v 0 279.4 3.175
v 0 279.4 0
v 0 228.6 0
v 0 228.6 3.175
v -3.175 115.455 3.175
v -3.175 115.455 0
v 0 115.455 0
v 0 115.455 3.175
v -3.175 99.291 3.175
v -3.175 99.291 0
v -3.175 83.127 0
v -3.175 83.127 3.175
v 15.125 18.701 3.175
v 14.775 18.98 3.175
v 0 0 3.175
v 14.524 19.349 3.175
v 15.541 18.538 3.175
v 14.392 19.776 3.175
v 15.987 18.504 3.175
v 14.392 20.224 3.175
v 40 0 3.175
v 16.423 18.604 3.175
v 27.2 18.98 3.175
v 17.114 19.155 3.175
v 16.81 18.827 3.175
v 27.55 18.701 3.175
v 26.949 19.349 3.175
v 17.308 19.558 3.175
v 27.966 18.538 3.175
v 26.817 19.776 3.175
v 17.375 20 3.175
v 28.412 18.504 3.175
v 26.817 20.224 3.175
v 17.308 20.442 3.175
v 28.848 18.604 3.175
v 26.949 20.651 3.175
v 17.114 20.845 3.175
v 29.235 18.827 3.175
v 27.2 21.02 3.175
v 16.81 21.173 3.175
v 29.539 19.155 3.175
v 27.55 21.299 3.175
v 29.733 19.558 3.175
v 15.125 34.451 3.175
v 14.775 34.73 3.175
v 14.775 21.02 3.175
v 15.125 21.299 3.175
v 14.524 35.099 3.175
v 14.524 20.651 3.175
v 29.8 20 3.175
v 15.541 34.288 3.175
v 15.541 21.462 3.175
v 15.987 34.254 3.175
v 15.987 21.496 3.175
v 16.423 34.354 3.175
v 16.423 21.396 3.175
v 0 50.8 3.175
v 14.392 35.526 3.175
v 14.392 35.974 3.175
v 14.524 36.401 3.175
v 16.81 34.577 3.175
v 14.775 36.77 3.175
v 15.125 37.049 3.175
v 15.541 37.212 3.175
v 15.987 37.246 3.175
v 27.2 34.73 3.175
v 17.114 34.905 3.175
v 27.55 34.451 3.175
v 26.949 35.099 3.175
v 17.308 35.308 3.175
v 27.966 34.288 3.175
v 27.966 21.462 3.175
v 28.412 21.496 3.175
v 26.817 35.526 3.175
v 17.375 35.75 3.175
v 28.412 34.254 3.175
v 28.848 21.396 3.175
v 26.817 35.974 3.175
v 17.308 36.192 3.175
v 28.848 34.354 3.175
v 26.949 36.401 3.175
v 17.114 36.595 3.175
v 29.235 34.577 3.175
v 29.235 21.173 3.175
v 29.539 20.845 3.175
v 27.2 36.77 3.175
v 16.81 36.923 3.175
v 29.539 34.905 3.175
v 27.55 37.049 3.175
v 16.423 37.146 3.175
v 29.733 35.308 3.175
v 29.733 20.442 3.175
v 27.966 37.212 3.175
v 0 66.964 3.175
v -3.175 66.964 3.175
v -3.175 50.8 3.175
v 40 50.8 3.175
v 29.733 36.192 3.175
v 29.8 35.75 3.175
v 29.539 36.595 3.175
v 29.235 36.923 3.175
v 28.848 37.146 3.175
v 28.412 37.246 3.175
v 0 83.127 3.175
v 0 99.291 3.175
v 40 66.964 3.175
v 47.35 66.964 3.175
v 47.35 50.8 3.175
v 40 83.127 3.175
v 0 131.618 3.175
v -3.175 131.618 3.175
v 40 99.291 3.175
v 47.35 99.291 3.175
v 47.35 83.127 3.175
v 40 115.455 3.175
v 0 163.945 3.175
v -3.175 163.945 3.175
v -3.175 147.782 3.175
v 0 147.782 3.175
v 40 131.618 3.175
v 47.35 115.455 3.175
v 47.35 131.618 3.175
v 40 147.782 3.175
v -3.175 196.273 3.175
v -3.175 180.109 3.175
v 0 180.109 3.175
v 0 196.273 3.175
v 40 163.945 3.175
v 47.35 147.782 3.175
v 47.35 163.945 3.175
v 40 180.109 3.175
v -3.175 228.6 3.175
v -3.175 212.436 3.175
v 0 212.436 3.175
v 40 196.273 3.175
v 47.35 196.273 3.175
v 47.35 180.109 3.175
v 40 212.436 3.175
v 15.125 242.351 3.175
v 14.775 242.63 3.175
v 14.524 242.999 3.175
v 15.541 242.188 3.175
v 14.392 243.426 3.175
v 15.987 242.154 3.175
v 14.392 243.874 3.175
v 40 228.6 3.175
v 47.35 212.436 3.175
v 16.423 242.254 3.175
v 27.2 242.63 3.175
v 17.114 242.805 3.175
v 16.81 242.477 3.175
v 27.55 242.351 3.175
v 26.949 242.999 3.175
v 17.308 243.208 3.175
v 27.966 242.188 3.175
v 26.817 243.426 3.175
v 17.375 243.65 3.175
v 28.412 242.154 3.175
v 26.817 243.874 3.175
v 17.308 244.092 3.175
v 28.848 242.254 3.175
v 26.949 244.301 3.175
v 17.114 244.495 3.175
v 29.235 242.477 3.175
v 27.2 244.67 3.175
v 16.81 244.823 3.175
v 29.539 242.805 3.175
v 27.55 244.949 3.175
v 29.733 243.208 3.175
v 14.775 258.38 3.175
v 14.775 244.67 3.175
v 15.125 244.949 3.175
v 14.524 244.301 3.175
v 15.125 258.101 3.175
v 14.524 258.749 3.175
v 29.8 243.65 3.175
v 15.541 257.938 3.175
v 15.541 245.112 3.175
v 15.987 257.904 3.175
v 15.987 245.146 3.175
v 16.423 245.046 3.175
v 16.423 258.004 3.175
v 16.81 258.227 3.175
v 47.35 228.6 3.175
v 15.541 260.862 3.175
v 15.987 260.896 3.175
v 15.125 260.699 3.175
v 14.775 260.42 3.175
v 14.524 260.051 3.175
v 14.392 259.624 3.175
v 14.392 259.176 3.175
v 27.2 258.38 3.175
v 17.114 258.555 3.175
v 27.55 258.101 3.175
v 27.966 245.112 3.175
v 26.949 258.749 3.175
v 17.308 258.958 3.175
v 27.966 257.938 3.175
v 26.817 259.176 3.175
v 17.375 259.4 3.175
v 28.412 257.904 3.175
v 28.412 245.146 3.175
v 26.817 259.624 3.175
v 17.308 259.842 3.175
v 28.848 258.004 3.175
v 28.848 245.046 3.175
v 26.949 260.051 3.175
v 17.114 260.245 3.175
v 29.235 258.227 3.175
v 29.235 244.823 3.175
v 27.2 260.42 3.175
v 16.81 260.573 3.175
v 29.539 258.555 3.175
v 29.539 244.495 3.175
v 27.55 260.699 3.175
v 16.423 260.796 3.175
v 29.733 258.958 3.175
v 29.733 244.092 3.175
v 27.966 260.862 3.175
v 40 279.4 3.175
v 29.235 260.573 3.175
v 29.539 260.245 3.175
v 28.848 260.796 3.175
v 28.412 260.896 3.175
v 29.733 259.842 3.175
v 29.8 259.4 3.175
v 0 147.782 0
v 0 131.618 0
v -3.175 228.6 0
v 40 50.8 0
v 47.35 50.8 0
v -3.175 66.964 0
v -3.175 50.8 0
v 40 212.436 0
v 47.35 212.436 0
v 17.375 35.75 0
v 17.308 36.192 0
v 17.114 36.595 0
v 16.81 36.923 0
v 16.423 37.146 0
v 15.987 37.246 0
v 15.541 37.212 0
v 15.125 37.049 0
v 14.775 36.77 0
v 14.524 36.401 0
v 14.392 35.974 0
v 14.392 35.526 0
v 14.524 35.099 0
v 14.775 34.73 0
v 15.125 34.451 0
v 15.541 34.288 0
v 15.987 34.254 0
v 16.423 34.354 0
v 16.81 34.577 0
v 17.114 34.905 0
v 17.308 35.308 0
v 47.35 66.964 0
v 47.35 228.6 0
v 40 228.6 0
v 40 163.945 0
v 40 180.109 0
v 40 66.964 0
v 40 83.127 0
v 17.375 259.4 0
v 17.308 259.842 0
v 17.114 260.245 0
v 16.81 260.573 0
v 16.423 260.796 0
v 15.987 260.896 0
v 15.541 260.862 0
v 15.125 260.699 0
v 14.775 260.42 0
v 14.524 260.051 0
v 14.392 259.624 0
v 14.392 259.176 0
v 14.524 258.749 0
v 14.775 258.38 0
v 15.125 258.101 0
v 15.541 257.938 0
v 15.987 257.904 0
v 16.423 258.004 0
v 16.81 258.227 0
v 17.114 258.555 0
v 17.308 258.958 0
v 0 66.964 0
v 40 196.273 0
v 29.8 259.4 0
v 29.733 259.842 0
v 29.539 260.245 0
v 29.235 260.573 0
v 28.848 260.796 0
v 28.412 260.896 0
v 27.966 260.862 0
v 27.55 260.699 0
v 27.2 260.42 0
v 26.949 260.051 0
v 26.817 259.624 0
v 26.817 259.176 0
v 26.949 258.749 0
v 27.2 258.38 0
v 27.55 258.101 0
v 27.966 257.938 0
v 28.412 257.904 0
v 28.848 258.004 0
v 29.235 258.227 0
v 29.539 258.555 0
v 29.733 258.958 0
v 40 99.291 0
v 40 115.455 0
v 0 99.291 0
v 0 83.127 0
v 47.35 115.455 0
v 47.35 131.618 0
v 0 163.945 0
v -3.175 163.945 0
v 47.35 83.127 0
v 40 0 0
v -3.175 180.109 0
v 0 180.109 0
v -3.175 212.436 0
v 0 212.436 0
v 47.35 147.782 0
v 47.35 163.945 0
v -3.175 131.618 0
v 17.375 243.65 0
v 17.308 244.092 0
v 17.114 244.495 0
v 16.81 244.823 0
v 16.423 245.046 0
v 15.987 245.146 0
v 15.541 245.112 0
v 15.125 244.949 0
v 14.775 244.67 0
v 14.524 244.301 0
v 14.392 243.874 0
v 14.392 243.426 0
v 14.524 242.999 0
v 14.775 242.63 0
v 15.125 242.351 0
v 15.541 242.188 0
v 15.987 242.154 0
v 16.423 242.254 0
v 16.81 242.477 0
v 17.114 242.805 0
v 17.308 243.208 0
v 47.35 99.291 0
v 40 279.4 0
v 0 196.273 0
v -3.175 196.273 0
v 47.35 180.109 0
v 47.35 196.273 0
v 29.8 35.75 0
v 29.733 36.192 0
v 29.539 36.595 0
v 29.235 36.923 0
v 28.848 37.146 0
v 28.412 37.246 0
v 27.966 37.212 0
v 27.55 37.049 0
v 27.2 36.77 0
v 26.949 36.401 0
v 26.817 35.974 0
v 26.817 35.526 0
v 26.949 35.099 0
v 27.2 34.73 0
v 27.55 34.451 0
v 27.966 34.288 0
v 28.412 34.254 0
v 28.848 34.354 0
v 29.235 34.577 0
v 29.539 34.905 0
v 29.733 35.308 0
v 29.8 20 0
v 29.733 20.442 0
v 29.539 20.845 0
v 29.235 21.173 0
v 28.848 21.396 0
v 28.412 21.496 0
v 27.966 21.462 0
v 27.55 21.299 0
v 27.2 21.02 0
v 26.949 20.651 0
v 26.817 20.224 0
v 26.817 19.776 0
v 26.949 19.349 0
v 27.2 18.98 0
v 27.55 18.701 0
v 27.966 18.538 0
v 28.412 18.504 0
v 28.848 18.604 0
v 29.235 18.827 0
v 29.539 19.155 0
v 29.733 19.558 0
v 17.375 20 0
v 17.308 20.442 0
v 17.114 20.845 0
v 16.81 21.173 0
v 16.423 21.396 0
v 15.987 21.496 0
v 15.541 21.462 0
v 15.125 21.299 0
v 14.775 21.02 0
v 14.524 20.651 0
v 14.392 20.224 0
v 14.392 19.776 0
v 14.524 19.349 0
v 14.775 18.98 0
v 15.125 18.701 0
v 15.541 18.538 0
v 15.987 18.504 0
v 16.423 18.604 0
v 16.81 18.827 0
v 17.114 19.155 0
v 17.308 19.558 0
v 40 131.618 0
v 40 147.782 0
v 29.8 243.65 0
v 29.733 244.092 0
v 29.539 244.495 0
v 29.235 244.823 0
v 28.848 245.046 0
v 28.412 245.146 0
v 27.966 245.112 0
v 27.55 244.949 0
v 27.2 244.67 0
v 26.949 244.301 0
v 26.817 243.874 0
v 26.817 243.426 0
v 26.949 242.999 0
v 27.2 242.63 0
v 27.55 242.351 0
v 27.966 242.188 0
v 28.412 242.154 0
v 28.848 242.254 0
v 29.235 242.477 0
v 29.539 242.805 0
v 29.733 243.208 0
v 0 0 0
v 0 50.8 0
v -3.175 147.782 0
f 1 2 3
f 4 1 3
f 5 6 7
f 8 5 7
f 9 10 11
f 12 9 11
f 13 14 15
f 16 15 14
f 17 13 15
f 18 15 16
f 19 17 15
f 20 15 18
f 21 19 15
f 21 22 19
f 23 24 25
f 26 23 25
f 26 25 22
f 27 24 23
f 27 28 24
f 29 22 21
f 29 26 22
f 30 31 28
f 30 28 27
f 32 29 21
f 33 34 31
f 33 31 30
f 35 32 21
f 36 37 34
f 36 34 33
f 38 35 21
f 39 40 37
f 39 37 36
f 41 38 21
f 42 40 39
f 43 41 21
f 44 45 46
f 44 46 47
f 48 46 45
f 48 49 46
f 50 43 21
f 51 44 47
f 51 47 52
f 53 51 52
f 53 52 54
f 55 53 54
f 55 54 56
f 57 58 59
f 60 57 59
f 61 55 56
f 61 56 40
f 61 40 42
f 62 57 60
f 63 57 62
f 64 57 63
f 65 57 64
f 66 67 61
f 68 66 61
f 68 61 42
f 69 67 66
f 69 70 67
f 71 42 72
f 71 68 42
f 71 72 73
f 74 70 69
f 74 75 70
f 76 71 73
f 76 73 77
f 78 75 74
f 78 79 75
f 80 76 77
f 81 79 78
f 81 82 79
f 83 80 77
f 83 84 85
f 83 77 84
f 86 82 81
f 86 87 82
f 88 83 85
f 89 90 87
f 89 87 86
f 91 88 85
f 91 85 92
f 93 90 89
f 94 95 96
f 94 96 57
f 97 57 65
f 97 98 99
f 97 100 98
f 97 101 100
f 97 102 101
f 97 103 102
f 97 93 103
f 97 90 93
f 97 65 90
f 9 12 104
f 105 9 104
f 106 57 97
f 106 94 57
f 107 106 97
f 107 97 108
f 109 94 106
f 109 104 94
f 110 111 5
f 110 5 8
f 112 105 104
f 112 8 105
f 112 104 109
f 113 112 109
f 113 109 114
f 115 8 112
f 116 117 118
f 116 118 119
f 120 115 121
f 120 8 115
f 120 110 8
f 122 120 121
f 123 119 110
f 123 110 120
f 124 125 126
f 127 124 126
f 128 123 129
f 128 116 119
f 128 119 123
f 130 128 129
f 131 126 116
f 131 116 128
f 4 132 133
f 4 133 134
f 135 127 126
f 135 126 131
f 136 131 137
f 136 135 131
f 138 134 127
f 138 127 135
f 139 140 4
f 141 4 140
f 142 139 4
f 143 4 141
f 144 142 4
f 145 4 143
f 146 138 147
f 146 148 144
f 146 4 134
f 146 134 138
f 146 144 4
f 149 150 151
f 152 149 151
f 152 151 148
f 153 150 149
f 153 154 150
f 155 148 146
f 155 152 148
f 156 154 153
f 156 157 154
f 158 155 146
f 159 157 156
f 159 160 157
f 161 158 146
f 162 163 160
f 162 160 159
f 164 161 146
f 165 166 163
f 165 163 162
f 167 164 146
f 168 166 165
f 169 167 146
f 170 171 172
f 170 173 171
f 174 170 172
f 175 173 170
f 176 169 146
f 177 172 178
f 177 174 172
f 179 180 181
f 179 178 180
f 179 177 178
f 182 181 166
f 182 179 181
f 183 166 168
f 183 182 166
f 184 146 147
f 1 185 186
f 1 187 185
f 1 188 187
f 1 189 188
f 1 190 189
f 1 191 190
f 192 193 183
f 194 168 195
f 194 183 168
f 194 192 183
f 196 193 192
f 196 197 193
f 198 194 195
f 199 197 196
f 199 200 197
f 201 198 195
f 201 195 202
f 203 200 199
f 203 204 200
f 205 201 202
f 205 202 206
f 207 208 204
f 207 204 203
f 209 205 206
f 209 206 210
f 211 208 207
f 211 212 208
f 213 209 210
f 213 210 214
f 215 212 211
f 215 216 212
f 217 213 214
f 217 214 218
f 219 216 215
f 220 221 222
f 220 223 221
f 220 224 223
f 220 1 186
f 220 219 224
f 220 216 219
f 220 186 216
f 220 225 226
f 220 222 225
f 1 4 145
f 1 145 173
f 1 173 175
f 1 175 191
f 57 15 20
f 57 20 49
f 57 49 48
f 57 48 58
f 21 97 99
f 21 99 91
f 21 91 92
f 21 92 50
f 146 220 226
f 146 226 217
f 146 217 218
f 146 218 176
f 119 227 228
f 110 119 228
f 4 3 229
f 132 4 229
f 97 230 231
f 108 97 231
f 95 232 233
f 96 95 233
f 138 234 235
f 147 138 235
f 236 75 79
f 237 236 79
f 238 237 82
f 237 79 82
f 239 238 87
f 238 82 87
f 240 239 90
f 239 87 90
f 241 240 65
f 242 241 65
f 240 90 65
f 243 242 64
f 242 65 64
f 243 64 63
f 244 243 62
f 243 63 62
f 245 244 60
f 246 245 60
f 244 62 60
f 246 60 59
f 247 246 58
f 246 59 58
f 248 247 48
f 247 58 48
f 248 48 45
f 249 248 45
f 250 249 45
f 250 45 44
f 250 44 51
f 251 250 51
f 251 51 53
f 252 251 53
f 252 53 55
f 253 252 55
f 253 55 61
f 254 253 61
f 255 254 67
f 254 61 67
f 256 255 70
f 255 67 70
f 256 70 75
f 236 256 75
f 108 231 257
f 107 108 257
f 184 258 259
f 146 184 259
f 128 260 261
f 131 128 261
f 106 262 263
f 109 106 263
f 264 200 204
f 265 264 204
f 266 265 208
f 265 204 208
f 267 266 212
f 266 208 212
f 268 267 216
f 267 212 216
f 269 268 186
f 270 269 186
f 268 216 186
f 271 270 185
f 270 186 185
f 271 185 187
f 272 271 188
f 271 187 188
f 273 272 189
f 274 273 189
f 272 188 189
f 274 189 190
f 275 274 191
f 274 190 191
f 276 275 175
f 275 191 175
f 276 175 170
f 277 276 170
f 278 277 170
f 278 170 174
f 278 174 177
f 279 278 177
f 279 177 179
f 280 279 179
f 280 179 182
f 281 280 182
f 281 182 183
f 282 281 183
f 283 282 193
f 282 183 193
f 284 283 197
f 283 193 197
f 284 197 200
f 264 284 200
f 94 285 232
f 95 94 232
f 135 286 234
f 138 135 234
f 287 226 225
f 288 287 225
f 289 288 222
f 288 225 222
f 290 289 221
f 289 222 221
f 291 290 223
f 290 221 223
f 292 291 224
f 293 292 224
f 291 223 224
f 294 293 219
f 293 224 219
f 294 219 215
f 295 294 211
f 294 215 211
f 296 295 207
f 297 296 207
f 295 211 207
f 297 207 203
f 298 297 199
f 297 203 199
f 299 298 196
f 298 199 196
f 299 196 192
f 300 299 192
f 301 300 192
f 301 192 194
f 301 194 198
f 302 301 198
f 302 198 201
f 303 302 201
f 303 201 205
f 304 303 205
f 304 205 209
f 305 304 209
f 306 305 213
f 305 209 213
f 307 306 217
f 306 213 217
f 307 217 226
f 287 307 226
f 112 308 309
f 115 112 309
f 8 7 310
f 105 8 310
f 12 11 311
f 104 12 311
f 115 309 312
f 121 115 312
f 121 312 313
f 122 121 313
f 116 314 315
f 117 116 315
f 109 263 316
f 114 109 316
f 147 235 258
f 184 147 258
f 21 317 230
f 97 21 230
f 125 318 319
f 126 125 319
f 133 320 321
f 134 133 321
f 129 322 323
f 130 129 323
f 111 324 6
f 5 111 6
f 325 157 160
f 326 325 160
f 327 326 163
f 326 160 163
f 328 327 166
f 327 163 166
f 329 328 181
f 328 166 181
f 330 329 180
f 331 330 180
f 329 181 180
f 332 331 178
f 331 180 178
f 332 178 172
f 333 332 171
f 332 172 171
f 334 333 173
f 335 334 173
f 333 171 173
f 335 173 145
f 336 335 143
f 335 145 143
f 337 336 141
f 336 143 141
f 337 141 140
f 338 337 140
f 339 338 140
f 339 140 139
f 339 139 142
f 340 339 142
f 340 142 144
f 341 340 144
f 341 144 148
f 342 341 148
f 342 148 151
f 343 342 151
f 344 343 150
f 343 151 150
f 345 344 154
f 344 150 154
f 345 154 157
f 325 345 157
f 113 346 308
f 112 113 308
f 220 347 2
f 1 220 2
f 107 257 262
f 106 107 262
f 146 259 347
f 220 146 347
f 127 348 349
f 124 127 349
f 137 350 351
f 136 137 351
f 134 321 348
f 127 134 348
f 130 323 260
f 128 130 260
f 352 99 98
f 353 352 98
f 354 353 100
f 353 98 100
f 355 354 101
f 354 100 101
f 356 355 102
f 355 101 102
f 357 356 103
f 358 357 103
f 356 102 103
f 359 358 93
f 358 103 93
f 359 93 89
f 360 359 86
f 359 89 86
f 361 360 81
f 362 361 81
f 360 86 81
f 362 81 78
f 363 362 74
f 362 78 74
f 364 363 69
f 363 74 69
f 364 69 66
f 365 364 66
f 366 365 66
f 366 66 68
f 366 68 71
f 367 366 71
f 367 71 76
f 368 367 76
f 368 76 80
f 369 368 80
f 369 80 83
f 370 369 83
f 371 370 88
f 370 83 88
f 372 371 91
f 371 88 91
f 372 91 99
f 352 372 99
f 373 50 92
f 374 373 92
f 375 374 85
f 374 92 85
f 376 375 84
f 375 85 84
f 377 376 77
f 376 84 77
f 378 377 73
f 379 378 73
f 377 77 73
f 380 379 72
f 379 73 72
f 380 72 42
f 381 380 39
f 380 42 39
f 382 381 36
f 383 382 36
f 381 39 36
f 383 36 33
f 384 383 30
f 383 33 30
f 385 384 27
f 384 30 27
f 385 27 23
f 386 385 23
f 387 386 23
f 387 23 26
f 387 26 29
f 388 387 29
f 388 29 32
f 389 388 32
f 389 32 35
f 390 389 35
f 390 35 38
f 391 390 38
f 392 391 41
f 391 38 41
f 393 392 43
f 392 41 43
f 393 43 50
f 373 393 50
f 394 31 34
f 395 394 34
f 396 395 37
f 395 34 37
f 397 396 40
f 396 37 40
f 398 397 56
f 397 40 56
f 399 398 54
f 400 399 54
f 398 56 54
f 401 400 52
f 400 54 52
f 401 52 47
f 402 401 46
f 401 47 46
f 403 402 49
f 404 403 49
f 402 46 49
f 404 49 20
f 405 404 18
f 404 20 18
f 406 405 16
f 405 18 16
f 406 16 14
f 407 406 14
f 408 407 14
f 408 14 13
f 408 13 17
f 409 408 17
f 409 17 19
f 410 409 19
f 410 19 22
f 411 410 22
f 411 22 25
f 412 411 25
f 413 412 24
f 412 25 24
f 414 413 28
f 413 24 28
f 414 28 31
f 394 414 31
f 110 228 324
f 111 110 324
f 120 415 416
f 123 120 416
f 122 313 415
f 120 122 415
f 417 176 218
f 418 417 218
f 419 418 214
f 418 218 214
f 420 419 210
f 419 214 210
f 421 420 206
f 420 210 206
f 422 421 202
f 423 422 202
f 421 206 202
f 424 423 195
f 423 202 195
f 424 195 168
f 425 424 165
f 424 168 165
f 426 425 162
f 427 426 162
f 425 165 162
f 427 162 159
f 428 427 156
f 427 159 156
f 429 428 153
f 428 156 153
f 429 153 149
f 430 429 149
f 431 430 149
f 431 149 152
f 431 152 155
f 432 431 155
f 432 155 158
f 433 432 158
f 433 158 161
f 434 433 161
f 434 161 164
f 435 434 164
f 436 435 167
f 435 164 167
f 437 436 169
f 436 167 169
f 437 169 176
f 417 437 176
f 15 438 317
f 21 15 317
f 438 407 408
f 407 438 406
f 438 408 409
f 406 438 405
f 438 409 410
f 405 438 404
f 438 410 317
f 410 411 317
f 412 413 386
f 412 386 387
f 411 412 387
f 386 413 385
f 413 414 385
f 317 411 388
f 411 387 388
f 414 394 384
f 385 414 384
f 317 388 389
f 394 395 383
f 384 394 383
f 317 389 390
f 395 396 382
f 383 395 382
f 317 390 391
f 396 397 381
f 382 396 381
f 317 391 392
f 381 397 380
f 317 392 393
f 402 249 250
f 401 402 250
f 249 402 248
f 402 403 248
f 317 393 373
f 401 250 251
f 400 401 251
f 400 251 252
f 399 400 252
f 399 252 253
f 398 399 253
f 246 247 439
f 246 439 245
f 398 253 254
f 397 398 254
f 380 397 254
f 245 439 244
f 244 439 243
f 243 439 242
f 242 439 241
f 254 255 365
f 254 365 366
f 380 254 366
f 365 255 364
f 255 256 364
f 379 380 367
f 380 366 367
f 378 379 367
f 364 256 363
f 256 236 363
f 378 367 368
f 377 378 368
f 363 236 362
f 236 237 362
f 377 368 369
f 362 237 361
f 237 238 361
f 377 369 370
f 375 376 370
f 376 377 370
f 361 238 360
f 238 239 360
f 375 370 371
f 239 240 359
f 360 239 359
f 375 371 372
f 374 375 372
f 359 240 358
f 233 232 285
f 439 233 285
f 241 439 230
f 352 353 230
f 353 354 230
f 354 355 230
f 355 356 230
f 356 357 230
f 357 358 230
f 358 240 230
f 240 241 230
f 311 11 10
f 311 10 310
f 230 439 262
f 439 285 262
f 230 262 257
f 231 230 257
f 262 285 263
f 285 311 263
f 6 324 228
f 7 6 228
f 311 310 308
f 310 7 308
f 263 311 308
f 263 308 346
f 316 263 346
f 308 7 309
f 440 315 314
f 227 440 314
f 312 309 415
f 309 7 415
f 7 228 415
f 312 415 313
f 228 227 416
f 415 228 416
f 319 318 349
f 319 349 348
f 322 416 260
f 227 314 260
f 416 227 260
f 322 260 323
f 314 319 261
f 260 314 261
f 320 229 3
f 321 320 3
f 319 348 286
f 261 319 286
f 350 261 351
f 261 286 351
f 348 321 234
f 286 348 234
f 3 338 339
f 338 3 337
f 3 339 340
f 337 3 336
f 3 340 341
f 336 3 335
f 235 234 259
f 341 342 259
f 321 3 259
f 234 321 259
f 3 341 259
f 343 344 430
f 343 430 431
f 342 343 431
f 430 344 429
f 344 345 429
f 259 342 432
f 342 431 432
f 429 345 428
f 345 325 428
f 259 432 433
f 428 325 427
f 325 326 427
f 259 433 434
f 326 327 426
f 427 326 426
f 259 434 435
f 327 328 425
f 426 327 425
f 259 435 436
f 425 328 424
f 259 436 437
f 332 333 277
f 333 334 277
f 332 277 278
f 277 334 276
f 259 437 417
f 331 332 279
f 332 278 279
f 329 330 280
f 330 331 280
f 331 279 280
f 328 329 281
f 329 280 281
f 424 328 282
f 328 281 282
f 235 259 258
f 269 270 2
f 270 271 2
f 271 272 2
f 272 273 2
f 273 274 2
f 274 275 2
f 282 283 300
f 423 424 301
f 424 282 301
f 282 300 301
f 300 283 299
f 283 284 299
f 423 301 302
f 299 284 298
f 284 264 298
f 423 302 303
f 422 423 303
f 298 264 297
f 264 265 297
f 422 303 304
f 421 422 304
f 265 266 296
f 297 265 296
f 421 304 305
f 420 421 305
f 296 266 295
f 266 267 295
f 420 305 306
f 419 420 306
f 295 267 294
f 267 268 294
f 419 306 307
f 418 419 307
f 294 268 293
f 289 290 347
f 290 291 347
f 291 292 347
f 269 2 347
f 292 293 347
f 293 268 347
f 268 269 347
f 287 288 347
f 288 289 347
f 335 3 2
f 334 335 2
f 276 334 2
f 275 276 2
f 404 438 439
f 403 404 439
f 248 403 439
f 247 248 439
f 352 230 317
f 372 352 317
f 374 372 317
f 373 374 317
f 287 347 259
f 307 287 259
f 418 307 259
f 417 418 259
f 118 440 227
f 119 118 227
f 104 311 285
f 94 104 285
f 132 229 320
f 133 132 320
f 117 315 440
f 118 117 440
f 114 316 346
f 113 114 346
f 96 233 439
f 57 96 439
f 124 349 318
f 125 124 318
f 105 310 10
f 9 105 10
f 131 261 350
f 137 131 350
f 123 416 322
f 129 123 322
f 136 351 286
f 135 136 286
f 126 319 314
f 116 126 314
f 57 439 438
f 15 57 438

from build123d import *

# Parameters (mm, degrees)
BOSS_EXTRUDE1_DEPTH = 3.175
SKETCH2_R           = 1.5
CUT_EXTRUDE1_DEPTH  = 3.175


with BuildPart() as part:
    # Sketch1 → Boss-Extrude1 (new body)
    with BuildSketch(Plane.XY):
        Polygon((40, 279.4), (0, 279.4), (0, 228.6), (-3.175, 228.6), (-3.175, 212.436363636), (0, 212.436363636), (0, 196.272727273), (-3.175, 196.272727273), (-3.175, 180.109090909), (0, 180.109090909), (0, 163.945454545), (-3.175, 163.945454545), (-3.175, 147.781818182), (0, 147.781818182), (0, 131.618181818), (-3.175, 131.618181818), (-3.175, 115.454545455), (0, 115.454545455), (0, 99.290909091), (-3.175, 99.290909091), (-3.175, 83.127272727), (0, 83.127272727), (0, 66.963636364), (-3.175, 66.963636364), (-3.175, 50.8), (0, 50.8), (0, 0), (40, 0), (40, 50.8), (47.35, 50.8), (47.35, 66.963636364), (40, 66.963636364), (40, 83.127272727), (47.35, 83.127272727), (47.35, 99.290909091), (40, 99.290909091), (40, 115.454545455), (47.35, 115.454545455), (47.35, 131.618181818), (40, 131.618181818), (40, 147.781818182), (47.35, 147.781818182), (47.35, 163.945454545), (40, 163.945454545), (40, 180.109090909), (47.35, 180.109090909), (47.35, 196.272727273), (40, 196.272727273), (40, 212.436363636), (47.35, 212.436363636), (47.35, 228.6), (40, 228.6), align=None)
    extrude(amount=BOSS_EXTRUDE1_DEPTH)

    # Sketch2 → Cut-Extrude1 (cut)
    with BuildSketch(Plane.XY.offset(3.175)):
        with Locations((15.875, 20)):
            Circle(SKETCH2_R)
        with Locations((15.875, 35.75)):
            Circle(SKETCH2_R)
        with Locations((15.875, 243.65)):
            Circle(SKETCH2_R)
        with Locations((15.875, 259.4)):
            Circle(SKETCH2_R)
        with Locations((28.3, 20)):
            Circle(SKETCH2_R)
        with Locations((28.3, 35.75)):
            Circle(SKETCH2_R)
        with Locations((28.3, 243.65)):
            Circle(SKETCH2_R)
        with Locations((28.3, 259.4)):
            Circle(SKETCH2_R)
    extrude(amount=-CUT_EXTRUDE1_DEPTH, mode=Mode.SUBTRACT)


solid = part.part
